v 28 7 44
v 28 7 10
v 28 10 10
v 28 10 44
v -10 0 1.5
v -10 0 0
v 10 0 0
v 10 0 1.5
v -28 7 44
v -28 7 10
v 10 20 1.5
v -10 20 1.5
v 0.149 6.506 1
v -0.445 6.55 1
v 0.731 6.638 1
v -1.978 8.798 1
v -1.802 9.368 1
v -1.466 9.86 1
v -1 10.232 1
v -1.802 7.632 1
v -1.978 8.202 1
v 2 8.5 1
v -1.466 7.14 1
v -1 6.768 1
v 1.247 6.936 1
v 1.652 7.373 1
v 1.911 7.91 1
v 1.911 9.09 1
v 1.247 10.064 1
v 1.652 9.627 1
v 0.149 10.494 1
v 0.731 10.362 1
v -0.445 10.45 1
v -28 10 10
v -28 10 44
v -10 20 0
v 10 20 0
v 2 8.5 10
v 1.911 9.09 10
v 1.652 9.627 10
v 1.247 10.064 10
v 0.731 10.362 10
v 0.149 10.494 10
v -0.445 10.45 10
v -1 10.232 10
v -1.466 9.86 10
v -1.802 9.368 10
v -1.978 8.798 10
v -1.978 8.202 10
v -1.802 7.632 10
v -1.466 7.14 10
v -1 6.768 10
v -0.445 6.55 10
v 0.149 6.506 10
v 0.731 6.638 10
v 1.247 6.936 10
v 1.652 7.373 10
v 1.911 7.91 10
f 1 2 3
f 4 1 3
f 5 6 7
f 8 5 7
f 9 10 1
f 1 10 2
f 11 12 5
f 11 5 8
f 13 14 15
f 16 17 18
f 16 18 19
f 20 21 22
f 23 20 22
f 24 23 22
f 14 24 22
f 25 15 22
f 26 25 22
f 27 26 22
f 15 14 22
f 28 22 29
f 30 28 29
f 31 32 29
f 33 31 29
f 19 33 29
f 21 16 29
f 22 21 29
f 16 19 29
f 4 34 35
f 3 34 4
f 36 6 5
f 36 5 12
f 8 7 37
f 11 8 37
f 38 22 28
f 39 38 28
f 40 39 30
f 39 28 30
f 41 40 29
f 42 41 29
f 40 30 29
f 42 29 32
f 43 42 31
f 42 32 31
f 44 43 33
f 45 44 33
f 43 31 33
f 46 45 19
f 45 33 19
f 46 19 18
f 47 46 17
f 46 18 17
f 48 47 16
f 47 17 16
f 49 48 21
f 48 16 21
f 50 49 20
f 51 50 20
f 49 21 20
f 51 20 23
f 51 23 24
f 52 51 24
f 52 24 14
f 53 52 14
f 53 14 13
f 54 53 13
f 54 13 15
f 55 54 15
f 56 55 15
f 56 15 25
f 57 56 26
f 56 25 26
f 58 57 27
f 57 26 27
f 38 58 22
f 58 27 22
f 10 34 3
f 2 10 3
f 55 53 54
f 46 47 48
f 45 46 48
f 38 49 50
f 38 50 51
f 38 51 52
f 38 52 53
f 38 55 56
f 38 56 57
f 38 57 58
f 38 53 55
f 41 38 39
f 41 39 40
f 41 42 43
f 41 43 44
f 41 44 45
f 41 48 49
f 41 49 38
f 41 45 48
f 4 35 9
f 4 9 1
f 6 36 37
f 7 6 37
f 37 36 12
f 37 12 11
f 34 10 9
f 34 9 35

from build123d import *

# Parameters (mm, degrees)
BOX_W          = 56
BOX_H          = 3
BOX_DEPTH      = 34
BOX001_W       = 20
BOX001_H       = 20
BOX001_DEPTH   = 1.5
CYLINDER_R     = 2
CYLINDER_DEPTH = 9


with BuildPart() as pantalla:
    # Box → Box (new body)
    with BuildSketch(Plane(origin=(-28, 7, 10), x_dir=(1, 0, 0), z_dir=(0, 0, 1))):
        with Locations((28, 1.5)):
            Rectangle(BOX_W, BOX_H)
    extrude(amount=BOX_DEPTH)


with BuildPart() as base:
    # Box001 → Box001 (new body)
    with BuildSketch(Plane(origin=(-10, 0, 0), x_dir=(1, 0, 0), z_dir=(0, 0, 1))):
        with Locations((10, 10)):
            Rectangle(BOX001_W, BOX001_H)
    extrude(amount=BOX001_DEPTH)


with BuildPart() as cilindro:
    # Cylinder → Cylinder (new body)
    with BuildSketch(Plane(origin=(0, 8.5, 1), x_dir=(1, 0, 0), z_dir=(0, 0, 1))):
        Circle(CYLINDER_R)
    extrude(amount=CYLINDER_DEPTH)


solid = Compound([pantalla.part, base.part, cilindro.part])
